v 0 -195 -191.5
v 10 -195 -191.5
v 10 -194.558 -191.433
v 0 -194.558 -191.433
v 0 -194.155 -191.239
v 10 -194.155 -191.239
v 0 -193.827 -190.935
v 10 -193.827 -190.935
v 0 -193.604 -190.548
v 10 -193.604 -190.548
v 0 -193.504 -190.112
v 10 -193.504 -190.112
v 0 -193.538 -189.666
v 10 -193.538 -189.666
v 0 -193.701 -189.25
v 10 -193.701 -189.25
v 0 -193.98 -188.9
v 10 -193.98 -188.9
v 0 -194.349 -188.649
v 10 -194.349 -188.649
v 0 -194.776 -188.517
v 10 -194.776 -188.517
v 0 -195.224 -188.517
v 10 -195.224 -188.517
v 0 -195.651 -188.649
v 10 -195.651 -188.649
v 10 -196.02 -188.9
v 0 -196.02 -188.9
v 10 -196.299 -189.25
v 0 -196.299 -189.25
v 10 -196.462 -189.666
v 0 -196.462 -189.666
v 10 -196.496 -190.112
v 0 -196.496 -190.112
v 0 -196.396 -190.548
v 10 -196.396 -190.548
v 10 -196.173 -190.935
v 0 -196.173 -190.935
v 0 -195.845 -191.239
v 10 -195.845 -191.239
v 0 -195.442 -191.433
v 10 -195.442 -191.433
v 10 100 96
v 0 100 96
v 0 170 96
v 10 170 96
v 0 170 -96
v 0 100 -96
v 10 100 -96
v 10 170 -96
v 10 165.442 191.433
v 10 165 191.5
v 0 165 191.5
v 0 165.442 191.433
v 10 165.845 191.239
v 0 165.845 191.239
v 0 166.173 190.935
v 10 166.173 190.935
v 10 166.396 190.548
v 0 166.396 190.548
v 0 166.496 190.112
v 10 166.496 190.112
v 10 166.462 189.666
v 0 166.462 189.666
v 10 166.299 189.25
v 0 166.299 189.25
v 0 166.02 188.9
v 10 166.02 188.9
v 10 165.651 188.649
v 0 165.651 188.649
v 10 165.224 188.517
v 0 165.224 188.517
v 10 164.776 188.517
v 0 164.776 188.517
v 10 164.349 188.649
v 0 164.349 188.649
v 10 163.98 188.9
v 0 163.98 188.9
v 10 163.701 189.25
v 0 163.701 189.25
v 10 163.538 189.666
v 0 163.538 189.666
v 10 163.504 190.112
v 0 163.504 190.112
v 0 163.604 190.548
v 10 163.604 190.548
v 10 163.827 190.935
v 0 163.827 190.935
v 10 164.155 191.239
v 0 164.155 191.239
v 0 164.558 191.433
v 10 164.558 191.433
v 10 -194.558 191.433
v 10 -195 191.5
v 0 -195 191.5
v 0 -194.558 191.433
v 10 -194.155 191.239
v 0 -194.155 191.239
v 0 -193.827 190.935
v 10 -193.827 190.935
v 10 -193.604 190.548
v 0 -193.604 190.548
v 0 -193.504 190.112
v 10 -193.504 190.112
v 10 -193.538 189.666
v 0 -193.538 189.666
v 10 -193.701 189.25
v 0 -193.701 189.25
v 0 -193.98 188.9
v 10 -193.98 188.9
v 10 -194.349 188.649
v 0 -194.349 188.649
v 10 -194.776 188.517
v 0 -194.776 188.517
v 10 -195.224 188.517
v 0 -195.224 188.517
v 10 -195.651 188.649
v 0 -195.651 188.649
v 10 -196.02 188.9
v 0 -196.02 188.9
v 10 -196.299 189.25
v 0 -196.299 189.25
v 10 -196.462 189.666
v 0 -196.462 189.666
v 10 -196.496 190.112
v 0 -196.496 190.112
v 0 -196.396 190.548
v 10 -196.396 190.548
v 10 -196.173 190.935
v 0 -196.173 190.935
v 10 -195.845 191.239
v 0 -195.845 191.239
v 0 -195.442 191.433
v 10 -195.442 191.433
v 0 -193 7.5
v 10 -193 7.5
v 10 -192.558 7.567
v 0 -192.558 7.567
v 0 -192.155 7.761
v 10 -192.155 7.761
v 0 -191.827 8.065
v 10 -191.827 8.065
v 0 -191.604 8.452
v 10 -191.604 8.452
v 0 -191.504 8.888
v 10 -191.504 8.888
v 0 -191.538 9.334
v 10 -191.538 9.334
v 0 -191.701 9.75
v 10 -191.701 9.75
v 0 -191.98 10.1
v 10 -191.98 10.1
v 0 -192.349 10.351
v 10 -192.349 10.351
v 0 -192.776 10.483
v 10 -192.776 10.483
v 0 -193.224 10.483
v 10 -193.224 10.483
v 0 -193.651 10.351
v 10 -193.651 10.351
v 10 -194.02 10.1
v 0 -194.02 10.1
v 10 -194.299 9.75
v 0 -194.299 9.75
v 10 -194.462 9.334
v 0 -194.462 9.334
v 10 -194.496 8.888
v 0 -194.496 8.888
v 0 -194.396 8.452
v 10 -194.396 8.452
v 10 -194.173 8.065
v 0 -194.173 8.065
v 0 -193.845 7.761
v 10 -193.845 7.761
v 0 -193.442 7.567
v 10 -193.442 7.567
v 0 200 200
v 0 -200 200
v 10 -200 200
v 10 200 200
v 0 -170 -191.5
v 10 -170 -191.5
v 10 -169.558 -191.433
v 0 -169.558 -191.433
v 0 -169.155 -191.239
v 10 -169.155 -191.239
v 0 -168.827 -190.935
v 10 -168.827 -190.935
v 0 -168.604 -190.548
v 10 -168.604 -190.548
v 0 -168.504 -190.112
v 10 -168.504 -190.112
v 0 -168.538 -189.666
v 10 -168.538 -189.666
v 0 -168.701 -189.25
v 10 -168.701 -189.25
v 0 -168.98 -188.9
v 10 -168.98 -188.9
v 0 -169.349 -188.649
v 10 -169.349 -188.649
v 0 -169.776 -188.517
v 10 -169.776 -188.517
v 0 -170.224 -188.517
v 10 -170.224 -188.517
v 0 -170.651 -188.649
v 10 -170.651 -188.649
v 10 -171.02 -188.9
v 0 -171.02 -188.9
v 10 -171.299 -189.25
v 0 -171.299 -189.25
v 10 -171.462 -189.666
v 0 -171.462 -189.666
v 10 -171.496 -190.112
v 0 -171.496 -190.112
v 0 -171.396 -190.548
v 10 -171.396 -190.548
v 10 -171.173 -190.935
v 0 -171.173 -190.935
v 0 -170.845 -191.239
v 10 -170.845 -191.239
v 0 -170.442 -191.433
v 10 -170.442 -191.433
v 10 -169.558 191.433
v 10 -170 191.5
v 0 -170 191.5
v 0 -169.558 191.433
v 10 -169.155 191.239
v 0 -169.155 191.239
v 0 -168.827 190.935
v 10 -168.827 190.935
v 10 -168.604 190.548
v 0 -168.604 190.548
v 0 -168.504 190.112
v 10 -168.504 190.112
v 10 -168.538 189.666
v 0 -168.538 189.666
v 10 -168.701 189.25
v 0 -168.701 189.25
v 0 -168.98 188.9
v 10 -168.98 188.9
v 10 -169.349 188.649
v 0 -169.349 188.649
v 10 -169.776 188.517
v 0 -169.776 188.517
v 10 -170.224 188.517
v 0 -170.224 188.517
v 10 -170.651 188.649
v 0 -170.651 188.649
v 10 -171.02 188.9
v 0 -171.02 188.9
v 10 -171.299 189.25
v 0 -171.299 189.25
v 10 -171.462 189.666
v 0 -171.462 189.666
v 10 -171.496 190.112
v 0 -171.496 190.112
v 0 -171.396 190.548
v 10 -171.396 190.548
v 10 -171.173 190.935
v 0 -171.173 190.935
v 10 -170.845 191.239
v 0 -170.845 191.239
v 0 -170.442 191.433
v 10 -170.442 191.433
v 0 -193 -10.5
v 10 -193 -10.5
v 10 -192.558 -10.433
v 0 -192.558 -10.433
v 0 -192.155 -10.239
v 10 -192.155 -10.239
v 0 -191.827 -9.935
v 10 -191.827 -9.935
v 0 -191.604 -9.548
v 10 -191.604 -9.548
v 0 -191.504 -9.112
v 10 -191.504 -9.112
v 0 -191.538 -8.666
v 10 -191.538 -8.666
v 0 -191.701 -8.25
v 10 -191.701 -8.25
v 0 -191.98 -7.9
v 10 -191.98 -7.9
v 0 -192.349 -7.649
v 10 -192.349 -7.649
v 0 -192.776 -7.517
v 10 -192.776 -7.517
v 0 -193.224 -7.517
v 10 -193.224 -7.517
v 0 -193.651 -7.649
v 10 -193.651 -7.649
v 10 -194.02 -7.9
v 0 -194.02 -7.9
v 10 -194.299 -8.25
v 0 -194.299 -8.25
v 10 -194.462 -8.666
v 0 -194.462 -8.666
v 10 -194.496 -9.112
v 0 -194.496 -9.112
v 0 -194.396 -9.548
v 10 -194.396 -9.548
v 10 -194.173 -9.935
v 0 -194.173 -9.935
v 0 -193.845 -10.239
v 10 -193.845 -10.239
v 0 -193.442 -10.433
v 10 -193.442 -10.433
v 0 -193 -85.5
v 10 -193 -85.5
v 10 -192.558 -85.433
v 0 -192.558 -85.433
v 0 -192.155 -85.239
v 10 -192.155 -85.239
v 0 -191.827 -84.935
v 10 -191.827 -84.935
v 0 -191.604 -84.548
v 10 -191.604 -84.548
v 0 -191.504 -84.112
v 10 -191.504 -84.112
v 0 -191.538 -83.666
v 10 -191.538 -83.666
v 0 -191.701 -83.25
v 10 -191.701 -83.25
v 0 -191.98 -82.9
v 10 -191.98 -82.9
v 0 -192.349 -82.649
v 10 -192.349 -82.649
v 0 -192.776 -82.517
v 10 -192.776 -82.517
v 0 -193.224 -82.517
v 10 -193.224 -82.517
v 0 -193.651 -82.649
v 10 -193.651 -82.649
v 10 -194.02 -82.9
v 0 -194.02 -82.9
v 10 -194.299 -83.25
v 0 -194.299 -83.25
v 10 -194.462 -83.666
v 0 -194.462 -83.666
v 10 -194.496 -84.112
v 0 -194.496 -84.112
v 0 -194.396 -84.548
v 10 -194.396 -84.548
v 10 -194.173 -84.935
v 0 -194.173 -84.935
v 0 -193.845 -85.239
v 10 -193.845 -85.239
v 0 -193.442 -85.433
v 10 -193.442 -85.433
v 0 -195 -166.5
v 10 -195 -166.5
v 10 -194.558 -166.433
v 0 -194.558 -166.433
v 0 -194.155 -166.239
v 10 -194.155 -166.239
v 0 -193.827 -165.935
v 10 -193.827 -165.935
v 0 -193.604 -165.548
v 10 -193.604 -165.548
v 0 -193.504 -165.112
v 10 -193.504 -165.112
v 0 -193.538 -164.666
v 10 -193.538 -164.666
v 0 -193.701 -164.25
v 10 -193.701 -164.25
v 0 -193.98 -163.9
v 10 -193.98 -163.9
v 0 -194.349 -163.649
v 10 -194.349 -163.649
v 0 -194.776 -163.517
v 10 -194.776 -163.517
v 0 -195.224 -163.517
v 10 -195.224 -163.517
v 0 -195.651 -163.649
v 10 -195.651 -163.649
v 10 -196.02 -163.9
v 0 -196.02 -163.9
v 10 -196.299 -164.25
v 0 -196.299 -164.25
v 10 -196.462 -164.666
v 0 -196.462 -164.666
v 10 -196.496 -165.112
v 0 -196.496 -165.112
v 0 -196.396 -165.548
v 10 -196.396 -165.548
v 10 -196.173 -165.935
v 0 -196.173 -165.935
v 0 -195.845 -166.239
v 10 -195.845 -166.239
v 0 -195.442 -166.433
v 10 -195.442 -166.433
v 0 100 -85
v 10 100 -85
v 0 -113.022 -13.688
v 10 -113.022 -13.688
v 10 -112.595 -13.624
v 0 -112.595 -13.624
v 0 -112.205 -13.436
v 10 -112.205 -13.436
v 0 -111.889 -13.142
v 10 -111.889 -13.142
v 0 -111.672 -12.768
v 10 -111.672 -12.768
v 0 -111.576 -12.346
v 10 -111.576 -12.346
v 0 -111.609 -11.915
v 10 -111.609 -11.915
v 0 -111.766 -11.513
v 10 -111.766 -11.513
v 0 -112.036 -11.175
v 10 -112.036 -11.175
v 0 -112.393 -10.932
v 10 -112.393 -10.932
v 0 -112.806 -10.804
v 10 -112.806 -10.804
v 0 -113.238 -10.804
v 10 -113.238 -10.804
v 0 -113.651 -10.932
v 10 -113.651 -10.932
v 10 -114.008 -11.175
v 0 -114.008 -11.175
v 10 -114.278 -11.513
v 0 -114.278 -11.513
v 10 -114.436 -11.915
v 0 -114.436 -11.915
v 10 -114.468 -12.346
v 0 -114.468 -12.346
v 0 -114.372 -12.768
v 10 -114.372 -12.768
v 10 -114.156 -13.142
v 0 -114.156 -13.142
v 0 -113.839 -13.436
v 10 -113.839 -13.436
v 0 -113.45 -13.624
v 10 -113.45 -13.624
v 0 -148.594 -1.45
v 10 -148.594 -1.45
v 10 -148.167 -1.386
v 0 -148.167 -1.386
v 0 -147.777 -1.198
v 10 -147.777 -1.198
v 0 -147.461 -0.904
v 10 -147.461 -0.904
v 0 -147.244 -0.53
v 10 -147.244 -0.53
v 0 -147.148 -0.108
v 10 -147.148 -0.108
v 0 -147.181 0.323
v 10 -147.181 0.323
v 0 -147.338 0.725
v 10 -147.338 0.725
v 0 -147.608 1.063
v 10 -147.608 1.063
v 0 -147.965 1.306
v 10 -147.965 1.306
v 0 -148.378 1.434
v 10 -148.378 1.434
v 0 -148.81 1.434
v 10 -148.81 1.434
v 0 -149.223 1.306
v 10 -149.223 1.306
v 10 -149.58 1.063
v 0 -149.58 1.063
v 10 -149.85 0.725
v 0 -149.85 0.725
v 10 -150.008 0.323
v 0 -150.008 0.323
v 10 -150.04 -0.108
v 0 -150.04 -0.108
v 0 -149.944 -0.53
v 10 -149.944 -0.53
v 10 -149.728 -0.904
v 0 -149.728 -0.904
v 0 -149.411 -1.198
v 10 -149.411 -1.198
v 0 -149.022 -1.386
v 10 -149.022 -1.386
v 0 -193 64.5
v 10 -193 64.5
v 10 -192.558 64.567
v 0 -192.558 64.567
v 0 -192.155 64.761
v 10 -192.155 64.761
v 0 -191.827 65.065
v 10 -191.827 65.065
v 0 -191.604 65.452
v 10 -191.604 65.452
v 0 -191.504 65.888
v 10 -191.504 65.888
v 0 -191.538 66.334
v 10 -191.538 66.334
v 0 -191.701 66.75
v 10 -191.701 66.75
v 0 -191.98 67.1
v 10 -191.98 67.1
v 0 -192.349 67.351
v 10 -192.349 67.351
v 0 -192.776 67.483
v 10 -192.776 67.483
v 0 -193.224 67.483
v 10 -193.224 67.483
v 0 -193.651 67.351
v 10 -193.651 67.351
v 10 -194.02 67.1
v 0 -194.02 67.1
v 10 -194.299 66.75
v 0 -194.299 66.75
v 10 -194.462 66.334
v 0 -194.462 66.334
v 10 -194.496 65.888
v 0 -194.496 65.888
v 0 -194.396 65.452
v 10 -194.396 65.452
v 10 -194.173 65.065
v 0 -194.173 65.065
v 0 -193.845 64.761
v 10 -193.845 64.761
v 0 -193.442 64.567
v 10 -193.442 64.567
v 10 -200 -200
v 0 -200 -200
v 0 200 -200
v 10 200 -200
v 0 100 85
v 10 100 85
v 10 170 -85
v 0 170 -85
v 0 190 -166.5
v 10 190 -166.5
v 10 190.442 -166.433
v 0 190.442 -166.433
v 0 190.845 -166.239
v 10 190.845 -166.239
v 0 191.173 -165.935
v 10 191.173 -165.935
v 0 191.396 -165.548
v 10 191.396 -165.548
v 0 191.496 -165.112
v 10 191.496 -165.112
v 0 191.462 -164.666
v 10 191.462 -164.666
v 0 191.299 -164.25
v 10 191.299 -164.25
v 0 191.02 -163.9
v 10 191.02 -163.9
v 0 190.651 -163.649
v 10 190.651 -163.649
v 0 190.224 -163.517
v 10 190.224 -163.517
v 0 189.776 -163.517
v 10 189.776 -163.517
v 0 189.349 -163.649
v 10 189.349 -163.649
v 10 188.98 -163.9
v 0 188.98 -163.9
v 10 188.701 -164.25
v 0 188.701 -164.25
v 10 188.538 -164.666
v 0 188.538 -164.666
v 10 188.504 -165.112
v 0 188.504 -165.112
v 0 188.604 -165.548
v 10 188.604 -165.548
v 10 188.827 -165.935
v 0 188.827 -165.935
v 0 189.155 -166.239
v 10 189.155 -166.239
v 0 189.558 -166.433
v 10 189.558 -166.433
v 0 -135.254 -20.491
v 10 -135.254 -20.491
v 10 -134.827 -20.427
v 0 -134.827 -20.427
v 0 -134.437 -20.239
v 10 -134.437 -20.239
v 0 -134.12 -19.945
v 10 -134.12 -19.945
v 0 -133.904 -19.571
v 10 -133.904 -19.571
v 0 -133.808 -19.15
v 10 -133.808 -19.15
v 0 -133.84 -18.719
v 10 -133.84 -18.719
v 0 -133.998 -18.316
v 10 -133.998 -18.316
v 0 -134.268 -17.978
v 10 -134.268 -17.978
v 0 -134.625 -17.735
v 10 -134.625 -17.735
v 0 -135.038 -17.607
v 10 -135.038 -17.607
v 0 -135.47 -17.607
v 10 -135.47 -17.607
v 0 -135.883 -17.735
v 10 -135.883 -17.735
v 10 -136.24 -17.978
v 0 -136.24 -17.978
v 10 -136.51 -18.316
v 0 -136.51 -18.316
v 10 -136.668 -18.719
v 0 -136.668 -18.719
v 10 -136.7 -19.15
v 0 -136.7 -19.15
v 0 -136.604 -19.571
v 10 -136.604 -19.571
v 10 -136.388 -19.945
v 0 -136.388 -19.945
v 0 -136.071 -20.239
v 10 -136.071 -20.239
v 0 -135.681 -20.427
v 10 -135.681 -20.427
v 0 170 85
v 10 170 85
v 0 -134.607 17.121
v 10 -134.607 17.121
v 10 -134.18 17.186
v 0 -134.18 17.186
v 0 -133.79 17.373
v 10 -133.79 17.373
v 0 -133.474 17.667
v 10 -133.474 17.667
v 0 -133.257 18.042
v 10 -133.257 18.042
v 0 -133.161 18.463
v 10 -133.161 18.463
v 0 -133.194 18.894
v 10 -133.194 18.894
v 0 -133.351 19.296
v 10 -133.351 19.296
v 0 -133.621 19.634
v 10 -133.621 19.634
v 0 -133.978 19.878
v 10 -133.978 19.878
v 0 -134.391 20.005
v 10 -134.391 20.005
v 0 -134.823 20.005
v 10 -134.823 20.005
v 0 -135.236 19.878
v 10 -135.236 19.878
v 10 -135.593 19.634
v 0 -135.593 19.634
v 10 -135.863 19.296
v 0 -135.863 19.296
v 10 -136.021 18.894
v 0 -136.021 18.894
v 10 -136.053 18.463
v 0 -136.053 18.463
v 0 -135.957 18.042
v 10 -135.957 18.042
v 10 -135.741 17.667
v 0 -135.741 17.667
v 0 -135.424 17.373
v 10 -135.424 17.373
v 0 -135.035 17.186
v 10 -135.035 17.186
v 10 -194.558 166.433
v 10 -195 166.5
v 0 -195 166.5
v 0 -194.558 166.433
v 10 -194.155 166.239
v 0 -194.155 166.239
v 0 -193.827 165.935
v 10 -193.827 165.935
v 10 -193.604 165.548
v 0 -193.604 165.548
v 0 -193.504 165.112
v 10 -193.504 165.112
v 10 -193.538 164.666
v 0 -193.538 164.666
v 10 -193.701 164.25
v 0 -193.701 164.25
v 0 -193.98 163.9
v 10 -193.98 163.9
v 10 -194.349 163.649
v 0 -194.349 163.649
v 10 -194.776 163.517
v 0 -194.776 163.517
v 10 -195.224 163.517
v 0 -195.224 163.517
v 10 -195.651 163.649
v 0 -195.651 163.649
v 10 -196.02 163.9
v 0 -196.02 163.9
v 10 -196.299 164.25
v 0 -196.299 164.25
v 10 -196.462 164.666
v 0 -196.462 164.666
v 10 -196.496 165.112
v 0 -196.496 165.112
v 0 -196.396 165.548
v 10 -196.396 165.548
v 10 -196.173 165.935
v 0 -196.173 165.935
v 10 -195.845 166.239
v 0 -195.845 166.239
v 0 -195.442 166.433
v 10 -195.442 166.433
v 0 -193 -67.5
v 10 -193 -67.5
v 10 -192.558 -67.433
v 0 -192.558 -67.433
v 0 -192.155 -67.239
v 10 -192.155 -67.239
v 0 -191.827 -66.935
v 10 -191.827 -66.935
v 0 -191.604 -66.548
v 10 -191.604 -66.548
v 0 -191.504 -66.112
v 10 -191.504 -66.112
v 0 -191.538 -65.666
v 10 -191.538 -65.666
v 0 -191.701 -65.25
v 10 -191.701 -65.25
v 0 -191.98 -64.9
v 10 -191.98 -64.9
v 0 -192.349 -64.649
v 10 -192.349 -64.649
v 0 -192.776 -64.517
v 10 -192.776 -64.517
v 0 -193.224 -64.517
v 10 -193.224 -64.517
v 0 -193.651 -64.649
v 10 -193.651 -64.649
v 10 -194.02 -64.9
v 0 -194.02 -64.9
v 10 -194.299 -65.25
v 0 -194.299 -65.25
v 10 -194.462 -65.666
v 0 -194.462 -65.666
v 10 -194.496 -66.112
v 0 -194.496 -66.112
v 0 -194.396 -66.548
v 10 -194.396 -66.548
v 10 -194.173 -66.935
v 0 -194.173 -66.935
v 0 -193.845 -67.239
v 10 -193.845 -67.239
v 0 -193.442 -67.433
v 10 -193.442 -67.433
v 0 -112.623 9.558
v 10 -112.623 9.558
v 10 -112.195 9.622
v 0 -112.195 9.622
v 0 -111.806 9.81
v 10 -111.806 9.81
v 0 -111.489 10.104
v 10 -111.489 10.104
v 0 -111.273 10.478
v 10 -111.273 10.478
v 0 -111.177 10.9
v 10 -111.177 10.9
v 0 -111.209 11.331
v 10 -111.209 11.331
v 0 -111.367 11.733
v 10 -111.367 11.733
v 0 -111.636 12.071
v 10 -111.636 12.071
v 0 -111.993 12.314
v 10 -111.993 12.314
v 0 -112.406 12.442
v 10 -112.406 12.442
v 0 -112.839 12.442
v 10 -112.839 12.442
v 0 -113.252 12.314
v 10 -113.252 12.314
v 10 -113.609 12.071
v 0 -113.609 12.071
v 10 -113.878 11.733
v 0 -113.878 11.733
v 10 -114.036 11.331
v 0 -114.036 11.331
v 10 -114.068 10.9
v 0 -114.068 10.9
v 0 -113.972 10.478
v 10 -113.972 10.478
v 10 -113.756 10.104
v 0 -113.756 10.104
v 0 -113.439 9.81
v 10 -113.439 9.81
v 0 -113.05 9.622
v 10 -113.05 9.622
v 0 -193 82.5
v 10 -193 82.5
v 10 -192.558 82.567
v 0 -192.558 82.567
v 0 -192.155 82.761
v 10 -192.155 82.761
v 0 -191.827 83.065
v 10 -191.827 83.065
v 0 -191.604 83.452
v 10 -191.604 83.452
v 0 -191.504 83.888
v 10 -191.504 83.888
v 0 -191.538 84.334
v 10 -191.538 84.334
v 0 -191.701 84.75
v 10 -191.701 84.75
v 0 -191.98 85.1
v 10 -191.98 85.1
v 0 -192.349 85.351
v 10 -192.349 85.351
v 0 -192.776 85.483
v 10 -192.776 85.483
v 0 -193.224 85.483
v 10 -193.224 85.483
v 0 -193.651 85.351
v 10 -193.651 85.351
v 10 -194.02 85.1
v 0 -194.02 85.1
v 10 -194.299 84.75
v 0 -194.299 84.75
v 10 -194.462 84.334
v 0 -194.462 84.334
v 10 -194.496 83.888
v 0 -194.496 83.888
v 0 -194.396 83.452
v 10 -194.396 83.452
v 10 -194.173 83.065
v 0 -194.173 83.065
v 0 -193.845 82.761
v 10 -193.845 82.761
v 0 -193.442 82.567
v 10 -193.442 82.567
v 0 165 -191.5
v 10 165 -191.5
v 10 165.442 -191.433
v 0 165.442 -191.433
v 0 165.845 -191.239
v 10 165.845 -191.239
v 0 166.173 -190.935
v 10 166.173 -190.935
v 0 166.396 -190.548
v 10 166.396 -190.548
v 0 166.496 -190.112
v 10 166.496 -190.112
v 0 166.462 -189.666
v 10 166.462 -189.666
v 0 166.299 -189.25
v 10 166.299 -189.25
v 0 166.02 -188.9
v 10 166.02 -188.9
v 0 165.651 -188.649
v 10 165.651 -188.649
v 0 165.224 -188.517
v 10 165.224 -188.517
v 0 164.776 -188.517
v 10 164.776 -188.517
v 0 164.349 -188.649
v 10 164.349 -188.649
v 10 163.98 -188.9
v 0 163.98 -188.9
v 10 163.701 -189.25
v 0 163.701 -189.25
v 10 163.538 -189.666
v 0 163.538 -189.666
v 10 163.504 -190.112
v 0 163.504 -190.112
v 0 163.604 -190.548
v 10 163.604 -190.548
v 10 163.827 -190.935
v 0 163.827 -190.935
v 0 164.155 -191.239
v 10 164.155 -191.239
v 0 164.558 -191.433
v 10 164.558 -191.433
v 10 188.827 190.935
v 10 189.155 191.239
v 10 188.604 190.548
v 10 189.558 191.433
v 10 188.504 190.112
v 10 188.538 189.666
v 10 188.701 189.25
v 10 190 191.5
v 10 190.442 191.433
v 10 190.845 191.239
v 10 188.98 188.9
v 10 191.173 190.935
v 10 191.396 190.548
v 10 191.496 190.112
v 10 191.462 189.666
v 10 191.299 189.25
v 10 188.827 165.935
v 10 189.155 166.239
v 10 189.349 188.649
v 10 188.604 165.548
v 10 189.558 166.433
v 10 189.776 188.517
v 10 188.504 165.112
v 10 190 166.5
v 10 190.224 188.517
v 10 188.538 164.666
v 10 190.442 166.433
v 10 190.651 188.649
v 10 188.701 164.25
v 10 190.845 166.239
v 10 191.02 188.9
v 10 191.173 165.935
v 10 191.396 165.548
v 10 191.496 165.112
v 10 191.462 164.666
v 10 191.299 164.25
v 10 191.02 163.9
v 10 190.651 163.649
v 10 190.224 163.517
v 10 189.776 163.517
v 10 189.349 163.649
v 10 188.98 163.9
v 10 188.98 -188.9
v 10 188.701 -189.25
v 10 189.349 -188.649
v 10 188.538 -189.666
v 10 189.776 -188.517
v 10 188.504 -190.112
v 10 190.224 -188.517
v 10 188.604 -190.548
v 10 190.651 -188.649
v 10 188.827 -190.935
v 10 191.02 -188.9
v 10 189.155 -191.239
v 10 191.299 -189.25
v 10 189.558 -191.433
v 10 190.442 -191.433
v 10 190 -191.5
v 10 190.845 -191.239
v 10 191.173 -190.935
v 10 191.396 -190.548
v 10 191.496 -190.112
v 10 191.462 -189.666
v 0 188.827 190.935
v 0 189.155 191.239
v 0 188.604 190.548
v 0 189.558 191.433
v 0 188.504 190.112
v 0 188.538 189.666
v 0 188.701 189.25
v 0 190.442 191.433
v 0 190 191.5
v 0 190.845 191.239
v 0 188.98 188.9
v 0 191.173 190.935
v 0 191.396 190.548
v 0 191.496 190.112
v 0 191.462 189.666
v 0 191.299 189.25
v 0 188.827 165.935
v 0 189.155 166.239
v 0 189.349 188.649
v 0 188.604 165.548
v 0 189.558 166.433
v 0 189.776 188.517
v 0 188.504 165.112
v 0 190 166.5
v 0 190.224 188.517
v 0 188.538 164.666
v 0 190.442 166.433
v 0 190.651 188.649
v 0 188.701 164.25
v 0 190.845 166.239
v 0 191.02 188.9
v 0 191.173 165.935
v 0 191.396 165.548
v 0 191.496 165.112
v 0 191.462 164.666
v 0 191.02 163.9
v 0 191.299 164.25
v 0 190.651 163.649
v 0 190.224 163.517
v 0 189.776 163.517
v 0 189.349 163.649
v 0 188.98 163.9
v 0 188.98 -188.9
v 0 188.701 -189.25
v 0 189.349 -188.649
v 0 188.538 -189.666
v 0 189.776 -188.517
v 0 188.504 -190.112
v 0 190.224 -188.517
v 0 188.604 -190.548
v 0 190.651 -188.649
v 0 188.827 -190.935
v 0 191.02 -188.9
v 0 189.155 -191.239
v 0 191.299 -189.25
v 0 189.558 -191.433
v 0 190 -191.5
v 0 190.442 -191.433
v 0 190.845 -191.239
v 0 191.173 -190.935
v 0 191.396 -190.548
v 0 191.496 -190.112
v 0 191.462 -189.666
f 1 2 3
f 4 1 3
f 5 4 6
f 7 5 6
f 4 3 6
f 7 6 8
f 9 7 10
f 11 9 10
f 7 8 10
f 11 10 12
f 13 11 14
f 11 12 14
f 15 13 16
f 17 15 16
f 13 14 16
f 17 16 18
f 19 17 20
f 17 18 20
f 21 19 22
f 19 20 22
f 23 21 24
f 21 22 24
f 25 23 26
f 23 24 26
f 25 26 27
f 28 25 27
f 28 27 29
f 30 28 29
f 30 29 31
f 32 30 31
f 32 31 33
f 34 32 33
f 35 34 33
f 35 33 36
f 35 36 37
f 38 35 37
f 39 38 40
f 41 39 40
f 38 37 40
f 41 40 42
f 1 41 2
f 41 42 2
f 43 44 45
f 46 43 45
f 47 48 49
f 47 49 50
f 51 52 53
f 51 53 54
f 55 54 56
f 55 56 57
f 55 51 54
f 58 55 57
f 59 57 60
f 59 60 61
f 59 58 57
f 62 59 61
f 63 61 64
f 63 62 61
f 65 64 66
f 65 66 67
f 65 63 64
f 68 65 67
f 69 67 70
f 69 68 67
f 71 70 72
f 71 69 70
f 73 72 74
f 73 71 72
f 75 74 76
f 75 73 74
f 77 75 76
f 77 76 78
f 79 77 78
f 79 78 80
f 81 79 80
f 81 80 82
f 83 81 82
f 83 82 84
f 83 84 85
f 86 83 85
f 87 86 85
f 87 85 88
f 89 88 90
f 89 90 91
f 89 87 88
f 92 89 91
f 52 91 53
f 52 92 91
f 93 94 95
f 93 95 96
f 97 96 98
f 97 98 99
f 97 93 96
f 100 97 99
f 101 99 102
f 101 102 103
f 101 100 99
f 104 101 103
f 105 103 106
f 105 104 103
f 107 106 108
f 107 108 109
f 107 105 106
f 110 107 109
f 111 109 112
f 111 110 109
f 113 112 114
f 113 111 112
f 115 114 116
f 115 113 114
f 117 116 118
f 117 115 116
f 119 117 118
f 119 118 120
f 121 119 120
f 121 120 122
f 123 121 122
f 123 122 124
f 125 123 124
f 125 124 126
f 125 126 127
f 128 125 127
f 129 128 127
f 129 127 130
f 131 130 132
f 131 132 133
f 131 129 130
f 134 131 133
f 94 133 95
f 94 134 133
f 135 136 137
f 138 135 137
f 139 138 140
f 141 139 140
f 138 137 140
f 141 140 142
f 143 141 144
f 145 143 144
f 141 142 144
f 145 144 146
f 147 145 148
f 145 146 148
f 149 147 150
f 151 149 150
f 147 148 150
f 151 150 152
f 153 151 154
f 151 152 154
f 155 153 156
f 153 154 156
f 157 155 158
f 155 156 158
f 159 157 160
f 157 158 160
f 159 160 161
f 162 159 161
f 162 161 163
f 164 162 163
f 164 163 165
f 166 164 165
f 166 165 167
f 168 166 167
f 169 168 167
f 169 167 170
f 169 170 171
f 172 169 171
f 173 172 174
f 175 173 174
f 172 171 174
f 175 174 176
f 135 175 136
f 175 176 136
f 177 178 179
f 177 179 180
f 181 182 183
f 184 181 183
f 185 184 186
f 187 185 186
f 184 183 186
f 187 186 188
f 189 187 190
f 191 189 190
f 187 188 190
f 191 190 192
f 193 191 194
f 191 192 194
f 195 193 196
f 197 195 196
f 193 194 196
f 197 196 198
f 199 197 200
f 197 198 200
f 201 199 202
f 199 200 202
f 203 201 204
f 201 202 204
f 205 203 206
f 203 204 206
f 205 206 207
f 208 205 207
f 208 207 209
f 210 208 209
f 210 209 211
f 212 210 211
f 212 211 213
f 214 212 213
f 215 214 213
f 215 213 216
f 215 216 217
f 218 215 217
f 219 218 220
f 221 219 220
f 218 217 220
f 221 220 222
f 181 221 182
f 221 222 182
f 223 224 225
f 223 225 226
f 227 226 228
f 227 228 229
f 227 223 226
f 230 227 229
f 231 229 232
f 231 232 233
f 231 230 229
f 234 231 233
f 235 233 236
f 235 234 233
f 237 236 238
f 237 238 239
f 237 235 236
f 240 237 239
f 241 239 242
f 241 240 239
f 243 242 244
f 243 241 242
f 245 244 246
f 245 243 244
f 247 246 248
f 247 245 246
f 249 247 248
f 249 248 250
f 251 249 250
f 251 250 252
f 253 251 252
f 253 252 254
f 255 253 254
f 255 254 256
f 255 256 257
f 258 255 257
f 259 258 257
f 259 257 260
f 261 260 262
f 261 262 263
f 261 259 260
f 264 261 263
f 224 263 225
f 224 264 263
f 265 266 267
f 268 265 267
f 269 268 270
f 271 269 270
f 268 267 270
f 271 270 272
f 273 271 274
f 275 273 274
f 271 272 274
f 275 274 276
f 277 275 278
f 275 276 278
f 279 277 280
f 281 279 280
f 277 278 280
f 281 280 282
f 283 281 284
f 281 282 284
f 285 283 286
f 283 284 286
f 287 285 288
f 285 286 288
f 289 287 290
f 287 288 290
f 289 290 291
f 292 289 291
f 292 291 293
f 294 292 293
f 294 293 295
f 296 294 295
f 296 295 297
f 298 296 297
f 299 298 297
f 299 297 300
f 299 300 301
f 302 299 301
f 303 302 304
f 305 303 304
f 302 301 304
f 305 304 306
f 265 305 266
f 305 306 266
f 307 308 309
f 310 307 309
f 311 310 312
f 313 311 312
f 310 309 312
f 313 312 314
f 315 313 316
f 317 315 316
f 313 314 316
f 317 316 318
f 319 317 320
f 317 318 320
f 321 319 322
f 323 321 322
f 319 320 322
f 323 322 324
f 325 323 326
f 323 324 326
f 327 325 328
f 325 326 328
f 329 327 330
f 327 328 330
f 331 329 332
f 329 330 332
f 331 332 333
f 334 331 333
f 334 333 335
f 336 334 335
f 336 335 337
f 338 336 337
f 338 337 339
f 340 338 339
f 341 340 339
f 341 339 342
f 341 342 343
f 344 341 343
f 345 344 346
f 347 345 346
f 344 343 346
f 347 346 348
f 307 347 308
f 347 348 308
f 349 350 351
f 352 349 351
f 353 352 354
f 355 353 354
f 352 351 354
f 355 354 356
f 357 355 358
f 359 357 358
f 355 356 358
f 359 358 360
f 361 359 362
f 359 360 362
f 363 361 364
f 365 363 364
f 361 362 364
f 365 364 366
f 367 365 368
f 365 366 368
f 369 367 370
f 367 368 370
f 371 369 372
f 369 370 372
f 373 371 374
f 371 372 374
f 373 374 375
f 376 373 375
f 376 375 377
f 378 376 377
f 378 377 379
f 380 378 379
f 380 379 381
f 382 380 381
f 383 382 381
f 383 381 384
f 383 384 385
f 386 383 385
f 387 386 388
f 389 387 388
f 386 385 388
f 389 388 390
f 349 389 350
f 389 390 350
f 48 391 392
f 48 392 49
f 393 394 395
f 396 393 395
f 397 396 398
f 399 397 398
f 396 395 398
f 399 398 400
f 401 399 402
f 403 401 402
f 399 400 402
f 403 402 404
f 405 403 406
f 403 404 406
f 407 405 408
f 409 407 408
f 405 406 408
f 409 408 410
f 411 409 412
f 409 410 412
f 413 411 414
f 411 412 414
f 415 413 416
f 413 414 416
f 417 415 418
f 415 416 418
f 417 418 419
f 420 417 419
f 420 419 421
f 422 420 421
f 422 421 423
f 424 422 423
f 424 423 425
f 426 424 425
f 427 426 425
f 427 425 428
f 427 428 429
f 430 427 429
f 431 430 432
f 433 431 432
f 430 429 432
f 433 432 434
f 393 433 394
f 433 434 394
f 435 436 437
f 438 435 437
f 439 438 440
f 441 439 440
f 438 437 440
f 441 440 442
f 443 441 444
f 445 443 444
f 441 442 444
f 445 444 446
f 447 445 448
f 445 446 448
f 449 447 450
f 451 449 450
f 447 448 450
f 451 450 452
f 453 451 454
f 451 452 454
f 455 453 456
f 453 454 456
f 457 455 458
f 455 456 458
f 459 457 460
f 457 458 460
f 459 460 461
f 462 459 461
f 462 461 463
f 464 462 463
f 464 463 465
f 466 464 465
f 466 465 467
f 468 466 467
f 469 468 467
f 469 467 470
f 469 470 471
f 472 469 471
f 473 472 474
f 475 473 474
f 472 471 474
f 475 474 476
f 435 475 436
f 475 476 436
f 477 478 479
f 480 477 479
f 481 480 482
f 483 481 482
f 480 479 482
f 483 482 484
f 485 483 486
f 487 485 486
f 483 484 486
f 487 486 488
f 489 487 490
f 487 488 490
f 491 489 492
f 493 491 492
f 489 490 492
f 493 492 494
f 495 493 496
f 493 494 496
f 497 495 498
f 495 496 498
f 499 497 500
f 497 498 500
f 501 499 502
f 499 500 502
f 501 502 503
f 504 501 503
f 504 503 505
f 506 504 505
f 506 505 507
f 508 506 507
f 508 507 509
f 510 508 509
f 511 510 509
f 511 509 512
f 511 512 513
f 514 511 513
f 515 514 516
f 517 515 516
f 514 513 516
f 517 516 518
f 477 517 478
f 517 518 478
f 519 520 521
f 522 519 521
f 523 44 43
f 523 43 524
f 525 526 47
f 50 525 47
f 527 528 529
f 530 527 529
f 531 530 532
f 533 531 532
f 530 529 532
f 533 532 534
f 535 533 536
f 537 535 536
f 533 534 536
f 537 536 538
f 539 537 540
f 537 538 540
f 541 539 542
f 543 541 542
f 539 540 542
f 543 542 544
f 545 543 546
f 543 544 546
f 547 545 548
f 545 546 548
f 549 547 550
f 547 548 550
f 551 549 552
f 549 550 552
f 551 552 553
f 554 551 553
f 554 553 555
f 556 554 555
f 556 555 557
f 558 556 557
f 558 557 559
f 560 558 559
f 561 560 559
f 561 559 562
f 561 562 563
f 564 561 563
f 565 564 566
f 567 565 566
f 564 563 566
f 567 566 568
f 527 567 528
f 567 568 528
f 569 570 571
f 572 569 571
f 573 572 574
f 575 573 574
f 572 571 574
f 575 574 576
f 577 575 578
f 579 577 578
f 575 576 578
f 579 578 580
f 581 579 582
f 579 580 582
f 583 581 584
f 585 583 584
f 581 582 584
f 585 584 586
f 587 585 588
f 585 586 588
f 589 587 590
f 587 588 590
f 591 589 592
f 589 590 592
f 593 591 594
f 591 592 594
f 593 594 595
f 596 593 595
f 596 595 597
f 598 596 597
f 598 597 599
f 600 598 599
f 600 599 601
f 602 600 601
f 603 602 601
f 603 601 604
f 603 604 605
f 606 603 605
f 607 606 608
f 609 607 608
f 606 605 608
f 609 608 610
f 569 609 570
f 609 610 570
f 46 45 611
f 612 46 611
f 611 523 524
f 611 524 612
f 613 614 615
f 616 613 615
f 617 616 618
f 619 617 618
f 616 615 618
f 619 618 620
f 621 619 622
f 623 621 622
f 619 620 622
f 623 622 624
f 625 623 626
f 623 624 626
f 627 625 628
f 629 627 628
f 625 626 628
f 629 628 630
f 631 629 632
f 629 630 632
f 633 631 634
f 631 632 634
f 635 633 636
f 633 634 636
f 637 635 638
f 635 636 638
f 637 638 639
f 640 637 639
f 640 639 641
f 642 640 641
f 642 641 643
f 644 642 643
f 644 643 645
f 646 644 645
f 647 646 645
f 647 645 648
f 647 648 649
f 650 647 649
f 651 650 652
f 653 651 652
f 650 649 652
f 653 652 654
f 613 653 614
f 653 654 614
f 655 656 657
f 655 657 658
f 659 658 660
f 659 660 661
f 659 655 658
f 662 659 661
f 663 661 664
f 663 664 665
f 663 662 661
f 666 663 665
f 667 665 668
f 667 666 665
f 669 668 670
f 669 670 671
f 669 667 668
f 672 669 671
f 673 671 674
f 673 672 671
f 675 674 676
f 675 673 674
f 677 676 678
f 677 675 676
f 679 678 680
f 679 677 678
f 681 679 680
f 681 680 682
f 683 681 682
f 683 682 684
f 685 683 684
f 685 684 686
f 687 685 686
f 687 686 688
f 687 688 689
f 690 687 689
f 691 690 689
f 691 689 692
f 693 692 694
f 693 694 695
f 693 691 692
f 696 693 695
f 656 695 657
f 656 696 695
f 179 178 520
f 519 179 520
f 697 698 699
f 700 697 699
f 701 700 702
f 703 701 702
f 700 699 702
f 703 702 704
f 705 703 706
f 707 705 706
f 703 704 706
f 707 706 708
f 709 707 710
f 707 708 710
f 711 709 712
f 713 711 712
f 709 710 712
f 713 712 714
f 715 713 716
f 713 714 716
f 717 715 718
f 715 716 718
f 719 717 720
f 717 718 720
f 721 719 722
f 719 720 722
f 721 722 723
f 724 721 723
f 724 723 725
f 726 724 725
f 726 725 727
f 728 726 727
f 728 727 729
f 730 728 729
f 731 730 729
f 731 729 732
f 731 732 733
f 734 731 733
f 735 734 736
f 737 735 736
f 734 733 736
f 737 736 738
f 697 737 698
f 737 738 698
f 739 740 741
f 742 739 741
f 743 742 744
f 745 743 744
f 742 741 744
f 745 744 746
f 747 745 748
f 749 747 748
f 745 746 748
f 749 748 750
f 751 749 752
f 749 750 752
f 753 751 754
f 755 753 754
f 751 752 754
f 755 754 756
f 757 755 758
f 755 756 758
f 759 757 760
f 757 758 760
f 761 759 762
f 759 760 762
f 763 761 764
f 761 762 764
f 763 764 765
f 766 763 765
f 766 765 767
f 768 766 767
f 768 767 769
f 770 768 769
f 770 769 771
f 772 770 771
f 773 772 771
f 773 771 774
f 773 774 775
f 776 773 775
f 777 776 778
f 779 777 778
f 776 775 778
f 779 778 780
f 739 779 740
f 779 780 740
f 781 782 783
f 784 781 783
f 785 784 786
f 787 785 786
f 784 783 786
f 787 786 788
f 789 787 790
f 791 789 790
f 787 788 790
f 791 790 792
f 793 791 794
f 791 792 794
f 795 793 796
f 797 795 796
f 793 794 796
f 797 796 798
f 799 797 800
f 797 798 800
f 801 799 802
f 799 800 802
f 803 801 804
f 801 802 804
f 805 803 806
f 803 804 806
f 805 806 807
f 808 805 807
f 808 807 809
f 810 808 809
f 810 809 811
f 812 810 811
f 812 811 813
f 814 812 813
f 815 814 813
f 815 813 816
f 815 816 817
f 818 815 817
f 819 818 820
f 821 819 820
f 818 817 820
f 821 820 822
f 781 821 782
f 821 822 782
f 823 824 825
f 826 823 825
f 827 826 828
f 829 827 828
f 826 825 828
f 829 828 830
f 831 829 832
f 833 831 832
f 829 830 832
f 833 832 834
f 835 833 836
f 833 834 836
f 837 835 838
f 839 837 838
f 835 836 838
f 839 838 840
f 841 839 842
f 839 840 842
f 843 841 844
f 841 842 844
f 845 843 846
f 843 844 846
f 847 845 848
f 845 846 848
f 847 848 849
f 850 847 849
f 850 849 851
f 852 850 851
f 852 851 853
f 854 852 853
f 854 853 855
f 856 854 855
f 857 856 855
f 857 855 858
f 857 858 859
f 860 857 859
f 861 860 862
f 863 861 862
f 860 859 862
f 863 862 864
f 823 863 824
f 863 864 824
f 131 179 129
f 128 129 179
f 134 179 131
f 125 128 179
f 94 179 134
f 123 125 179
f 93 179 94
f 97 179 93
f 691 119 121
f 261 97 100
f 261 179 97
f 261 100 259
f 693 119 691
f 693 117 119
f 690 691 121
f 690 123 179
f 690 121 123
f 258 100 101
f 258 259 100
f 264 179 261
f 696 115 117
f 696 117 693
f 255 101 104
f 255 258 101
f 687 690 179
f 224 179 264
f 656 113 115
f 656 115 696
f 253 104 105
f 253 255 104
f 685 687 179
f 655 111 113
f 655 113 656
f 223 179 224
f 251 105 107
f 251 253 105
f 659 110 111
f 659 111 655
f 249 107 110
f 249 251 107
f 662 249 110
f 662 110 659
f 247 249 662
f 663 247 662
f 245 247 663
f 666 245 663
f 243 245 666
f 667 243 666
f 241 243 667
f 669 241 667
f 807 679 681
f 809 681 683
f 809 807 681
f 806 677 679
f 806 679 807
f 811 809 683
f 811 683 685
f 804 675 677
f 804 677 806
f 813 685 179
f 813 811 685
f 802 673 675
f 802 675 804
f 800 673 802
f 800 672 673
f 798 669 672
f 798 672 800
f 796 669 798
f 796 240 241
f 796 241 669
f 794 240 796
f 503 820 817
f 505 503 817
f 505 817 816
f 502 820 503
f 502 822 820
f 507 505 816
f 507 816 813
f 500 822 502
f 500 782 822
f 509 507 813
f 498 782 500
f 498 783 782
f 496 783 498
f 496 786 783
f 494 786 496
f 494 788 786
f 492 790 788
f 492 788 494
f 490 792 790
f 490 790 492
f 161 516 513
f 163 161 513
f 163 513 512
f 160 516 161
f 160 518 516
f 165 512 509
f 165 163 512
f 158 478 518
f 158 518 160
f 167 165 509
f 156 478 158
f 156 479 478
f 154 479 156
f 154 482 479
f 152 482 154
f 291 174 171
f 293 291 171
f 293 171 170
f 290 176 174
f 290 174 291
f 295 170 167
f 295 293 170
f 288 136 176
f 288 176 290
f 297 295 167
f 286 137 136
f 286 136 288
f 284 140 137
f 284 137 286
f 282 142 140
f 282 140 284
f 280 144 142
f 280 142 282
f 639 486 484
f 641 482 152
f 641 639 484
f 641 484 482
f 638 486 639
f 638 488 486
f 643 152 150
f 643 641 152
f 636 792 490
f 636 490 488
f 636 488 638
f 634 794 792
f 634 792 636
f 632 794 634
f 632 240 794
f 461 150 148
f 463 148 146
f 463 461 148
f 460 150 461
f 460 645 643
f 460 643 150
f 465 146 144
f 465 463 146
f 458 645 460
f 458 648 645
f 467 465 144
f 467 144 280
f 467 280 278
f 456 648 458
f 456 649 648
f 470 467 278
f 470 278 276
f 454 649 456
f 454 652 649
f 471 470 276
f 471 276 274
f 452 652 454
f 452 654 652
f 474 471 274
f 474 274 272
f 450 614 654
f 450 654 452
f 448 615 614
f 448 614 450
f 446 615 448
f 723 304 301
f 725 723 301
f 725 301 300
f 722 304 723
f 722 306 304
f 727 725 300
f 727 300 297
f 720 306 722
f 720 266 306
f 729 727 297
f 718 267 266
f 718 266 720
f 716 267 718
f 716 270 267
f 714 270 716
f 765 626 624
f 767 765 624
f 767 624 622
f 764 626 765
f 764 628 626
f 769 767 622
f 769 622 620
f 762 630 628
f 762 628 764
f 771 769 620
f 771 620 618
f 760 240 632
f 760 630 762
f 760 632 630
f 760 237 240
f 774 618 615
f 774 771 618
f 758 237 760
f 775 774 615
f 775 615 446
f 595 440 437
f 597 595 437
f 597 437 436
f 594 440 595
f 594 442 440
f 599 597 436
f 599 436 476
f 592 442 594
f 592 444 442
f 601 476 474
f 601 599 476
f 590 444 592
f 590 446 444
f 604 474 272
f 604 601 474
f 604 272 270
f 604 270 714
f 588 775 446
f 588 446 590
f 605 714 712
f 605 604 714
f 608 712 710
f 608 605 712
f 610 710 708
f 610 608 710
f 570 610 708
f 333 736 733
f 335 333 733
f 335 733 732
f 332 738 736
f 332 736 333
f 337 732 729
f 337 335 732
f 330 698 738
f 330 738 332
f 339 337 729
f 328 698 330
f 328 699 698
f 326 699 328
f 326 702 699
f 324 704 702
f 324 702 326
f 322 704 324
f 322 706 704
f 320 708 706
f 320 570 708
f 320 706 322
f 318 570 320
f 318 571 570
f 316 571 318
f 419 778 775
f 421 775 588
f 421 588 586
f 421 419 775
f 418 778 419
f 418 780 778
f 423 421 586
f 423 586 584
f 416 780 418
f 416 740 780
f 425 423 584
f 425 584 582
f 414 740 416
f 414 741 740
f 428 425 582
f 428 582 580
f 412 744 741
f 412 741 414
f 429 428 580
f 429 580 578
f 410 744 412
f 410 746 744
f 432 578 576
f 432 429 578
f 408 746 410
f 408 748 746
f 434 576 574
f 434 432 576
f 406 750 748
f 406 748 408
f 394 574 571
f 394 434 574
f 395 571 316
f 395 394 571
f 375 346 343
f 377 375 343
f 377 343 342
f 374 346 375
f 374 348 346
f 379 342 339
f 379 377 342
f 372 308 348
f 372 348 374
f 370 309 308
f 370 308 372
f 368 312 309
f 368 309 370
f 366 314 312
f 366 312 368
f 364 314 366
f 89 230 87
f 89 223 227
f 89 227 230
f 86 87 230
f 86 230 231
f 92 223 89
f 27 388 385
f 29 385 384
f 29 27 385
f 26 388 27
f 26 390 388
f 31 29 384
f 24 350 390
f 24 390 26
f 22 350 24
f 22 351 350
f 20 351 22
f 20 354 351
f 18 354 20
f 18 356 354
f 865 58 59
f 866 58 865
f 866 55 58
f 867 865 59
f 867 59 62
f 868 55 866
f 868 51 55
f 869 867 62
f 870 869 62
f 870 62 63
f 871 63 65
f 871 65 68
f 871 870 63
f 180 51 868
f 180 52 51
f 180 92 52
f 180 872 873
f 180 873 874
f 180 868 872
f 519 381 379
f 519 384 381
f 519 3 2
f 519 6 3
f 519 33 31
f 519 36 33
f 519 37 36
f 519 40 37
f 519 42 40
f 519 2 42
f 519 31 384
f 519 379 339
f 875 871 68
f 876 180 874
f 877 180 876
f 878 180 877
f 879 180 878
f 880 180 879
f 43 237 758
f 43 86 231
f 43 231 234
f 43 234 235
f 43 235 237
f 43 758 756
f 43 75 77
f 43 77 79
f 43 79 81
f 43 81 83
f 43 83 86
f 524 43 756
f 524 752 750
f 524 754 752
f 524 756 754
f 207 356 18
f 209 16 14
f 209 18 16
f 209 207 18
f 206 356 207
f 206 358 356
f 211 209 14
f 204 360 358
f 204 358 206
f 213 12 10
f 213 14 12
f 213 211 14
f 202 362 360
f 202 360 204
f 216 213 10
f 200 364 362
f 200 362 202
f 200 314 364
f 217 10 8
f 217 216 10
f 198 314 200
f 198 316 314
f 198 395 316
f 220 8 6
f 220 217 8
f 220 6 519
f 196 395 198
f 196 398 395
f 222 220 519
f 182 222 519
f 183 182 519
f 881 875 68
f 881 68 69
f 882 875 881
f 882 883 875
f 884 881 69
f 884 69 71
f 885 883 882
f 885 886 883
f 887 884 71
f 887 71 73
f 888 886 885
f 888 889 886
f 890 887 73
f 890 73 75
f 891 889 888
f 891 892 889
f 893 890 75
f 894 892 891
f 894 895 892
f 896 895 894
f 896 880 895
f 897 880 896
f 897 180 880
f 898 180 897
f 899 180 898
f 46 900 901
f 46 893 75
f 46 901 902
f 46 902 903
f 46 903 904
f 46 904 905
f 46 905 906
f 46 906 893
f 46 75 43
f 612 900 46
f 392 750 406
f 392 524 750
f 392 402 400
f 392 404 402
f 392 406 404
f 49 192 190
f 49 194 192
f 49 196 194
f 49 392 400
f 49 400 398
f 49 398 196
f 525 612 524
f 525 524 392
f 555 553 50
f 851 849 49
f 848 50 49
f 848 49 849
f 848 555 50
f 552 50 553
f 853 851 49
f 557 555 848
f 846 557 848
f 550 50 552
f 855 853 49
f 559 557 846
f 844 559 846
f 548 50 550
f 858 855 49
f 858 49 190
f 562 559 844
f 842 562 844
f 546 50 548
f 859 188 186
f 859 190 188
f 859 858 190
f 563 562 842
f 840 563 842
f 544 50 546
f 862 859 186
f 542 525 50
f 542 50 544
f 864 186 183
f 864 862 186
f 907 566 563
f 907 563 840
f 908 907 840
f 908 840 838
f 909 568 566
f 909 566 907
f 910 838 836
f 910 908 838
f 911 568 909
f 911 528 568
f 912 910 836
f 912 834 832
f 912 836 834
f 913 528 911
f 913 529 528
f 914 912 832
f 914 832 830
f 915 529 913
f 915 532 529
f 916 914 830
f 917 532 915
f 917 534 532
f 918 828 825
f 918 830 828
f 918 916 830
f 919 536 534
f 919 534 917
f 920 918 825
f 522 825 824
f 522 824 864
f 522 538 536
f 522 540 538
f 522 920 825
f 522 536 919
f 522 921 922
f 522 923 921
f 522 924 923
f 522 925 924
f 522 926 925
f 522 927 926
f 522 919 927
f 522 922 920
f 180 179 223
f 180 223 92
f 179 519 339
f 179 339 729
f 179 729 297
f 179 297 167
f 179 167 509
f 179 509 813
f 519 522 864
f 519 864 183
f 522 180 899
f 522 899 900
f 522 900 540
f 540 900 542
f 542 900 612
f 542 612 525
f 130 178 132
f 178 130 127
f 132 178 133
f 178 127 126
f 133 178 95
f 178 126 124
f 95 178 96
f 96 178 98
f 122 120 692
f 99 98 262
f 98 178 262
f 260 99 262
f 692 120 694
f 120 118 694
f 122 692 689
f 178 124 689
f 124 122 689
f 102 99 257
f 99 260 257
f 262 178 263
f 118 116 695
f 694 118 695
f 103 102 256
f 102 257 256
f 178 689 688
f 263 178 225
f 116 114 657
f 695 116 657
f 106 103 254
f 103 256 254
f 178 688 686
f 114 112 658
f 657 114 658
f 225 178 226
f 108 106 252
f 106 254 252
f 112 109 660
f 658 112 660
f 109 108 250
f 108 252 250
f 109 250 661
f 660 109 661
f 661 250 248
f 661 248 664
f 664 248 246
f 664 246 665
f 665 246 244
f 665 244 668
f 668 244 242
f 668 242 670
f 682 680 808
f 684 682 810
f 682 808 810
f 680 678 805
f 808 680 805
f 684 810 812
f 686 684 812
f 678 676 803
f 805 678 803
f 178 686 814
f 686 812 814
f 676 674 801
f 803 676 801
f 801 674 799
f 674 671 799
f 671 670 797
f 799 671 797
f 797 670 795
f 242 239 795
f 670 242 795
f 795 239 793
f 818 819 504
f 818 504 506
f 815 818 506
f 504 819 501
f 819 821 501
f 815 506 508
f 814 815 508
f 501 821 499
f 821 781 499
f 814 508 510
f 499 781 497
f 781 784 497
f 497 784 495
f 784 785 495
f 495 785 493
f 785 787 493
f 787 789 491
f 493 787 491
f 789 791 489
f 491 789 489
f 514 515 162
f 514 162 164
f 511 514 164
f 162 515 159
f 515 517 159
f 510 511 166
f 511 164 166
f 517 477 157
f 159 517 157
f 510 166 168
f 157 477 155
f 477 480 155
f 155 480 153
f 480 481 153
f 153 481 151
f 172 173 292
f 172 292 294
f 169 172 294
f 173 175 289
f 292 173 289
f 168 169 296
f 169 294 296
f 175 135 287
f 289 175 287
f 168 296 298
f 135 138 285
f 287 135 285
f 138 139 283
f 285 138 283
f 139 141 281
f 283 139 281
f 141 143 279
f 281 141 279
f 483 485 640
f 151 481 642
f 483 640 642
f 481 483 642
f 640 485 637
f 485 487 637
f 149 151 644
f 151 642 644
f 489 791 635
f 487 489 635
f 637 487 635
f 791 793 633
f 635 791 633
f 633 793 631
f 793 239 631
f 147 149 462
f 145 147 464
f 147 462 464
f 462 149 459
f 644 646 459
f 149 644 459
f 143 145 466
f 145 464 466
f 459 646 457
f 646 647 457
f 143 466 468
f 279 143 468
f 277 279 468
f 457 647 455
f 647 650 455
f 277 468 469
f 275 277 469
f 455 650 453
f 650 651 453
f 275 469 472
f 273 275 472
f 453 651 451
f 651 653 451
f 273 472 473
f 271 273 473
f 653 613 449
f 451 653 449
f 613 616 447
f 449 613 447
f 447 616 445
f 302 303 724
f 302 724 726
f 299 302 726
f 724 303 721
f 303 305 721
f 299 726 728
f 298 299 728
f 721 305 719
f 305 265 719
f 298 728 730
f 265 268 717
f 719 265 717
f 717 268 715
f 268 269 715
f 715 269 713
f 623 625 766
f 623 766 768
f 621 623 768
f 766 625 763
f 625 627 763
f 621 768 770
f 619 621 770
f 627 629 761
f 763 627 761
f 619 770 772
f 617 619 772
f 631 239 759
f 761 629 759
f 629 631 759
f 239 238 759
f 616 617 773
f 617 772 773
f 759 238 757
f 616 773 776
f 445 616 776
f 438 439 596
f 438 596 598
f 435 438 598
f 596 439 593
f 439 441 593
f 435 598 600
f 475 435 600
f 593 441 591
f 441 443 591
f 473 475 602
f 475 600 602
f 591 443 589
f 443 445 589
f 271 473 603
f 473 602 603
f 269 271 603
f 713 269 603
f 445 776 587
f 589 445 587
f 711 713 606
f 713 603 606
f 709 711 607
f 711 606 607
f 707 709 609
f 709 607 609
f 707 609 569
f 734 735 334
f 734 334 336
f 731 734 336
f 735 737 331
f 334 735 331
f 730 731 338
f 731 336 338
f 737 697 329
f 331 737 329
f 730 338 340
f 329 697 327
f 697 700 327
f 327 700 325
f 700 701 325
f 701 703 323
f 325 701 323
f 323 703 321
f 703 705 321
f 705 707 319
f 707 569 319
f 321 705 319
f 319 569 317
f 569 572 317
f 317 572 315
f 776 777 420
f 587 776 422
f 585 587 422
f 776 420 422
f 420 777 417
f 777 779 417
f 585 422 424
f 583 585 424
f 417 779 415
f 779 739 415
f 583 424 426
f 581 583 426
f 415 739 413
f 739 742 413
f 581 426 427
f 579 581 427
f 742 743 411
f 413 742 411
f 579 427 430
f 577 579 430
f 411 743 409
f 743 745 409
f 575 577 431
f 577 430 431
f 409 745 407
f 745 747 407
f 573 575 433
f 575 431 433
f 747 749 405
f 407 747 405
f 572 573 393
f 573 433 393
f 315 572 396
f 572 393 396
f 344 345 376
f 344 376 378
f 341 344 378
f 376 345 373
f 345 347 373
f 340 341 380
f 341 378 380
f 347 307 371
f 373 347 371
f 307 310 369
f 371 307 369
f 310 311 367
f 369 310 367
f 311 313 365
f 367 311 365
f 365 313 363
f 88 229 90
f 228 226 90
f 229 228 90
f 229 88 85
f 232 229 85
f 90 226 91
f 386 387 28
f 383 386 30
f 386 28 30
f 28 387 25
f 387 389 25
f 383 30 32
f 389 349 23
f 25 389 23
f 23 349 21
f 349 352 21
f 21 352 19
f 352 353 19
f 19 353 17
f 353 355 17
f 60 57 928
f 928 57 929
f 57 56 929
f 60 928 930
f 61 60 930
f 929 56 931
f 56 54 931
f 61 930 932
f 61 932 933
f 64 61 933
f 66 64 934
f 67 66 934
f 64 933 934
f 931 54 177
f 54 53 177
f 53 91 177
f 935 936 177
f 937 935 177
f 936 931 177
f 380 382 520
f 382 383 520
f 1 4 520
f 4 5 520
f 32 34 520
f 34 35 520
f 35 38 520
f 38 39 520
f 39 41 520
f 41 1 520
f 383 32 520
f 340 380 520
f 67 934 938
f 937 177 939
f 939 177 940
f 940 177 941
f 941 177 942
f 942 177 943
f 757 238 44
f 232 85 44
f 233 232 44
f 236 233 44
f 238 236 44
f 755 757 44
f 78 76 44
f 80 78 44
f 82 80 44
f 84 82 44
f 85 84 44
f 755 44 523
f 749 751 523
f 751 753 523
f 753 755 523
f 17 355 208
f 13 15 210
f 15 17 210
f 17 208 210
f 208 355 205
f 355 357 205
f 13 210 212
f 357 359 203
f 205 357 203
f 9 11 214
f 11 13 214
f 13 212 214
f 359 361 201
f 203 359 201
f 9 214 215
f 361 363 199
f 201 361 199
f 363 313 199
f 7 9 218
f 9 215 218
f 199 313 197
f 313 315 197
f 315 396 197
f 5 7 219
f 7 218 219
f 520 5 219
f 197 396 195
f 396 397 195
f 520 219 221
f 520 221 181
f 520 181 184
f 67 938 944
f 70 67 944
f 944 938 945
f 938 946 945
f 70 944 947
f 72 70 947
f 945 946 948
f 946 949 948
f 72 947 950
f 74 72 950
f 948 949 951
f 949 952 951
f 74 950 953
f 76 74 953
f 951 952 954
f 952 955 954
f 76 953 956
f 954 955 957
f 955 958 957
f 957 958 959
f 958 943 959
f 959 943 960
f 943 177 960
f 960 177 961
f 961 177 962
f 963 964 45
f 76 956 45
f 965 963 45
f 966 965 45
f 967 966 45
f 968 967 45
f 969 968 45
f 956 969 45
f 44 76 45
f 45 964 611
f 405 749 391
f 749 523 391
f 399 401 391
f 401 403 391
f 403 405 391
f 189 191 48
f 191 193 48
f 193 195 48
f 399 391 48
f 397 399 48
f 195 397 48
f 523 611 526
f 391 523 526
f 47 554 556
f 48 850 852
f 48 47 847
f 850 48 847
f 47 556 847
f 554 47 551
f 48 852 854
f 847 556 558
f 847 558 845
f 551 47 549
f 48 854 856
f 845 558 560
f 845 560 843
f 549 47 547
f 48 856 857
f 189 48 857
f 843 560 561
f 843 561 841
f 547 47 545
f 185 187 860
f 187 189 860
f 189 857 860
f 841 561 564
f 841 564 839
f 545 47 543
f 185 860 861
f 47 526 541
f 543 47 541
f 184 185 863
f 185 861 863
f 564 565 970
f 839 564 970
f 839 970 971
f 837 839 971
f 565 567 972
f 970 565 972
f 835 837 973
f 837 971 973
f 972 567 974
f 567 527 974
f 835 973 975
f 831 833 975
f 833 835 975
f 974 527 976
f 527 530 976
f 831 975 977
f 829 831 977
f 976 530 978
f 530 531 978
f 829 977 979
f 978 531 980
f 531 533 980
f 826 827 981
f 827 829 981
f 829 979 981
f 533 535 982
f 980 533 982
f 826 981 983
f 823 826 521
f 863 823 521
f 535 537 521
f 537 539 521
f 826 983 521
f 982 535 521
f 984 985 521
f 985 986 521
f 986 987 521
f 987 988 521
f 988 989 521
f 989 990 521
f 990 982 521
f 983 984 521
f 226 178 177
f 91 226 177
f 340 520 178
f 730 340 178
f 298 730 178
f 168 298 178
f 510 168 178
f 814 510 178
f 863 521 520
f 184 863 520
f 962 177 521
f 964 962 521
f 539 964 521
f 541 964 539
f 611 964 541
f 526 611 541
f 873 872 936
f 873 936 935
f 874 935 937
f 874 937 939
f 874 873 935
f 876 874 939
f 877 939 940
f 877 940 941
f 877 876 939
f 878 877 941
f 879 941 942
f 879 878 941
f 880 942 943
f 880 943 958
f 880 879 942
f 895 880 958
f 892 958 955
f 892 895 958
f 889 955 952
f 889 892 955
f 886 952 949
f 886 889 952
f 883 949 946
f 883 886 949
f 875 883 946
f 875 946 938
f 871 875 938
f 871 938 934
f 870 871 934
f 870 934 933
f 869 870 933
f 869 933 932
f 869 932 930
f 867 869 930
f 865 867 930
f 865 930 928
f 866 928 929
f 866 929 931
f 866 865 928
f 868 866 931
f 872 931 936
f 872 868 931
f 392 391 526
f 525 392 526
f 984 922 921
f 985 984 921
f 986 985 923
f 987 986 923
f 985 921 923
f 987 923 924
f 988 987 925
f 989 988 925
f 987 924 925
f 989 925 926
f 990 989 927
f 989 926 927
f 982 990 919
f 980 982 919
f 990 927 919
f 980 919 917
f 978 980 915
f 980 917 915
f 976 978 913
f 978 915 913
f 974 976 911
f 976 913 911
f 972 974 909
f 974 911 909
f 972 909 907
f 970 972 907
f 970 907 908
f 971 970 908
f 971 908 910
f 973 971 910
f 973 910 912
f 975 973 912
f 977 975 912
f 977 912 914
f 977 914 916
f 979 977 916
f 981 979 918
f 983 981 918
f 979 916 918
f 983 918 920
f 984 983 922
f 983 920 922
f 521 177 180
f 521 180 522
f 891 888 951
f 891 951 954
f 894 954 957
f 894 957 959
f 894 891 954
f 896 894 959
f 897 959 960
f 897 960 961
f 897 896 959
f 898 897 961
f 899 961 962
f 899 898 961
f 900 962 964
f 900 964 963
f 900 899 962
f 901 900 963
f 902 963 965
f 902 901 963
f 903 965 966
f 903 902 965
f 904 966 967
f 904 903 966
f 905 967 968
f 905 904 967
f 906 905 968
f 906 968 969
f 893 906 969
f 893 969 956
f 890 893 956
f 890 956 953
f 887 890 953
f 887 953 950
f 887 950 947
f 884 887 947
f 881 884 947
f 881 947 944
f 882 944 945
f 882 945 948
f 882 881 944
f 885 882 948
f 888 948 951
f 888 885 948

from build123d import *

# Parameters (mm, degrees)
SKETCH_1_W          = 400
SKETCH_1_H          = 400
EXTRUDE_1_DEPTH     = 10
SKETCH_2_R          = 1.5
CUT_EXTRUDE_1_DEPTH = 10
SKETCH_3_R          = 1.5
CUT_EXTRUDE_2_DEPTH = 10
SKETCH_4_R          = 1.45
CUT_EXTRUDE_3_DEPTH = 10
SKETCH_5_W          = 11
SKETCH_5_H          = 70
CUT_EXTRUDE_5_DEPTH = 10


with BuildPart() as part:
    # 草图1 → 凸台-拉伸1 (new body)
    with BuildSketch(Plane(origin=(0, 0, 0), x_dir=(0, 0, -1), z_dir=(1, 0, 0))):
        Rectangle(SKETCH_1_W, SKETCH_1_H)
    extrude(amount=EXTRUDE_1_DEPTH)

    # 草图2 → 切除-拉伸1 (cut)
    with BuildSketch(Plane(origin=(10, 0, 0), x_dir=(0, 0, -1), z_dir=(1, 0, 0))):
        with Locations((190, 190)):
            Circle(SKETCH_2_R)
        with Locations((165, 190)):
            Circle(SKETCH_2_R)
        with Locations((190, 165)):
            Circle(SKETCH_2_R)
        with Locations((190, -195)):
            Circle(SKETCH_2_R)
        with Locations((165, -195)):
            Circle(SKETCH_2_R)
        with Locations((190, -170)):
            Circle(SKETCH_2_R)
    cut_extrude_1 = extrude(amount=-CUT_EXTRUDE_1_DEPTH, mode=Mode.SUBTRACT)

    # 草图3 → 切除-拉伸2 (cut)
    with BuildSketch(Plane(origin=(10, 0, 0), x_dir=(0, 0, -1), z_dir=(1, 0, 0))):
        with Locations((-84, -193)):
            Circle(SKETCH_3_R)
        with Locations((-66, -193)):
            Circle(SKETCH_3_R)
        with Locations((-9, -193)):
            Circle(SKETCH_3_R)
        with Locations((9, -193)):
            Circle(SKETCH_3_R)
        with Locations((66, -193)):
            Circle(SKETCH_3_R)
        with Locations((84, -193)):
            Circle(SKETCH_3_R)
    extrude(amount=-CUT_EXTRUDE_2_DEPTH, mode=Mode.SUBTRACT)

    # 镜向1: 切除-拉伸1 across plane
    add(cut_extrude_1.mirror(Plane.XY), mode=Mode.SUBTRACT)

    # 草图4 → 切除-拉伸3 (cut)
    with BuildSketch(Plane(origin=(10, 0, 0), x_dir=(0, 0, -1), z_dir=(1, 0, 0))):
        with Locations((-11.007896697, -112.622517601)):
            Circle(SKETCH_4_R)
        with Locations((12.238028253, -113.022211572)):
            Circle(SKETCH_4_R)
        with Locations((-18.571414113, -134.607193773)):
            Circle(SKETCH_4_R)
        with Locations((19.041282557, -135.253912204)):
            Circle(SKETCH_4_R)
        with Locations((0, -148.59416485)):
            Circle(SKETCH_4_R)
    extrude(amount=-CUT_EXTRUDE_3_DEPTH, mode=Mode.SUBTRACT)

    # 草图5 → 切除-拉伸5 (cut)
    with BuildSketch(Plane(origin=(0, 0, 0), x_dir=(0, 0, -1), z_dir=(1, 0, 0))):
        with Locations((-90.5, 135)):
            Rectangle(SKETCH_5_W, SKETCH_5_H)
        with Locations((90.5, 135)):
            Rectangle(SKETCH_5_W, SKETCH_5_H)
    extrude(amount=CUT_EXTRUDE_5_DEPTH, mode=Mode.SUBTRACT)


solid = part.part
